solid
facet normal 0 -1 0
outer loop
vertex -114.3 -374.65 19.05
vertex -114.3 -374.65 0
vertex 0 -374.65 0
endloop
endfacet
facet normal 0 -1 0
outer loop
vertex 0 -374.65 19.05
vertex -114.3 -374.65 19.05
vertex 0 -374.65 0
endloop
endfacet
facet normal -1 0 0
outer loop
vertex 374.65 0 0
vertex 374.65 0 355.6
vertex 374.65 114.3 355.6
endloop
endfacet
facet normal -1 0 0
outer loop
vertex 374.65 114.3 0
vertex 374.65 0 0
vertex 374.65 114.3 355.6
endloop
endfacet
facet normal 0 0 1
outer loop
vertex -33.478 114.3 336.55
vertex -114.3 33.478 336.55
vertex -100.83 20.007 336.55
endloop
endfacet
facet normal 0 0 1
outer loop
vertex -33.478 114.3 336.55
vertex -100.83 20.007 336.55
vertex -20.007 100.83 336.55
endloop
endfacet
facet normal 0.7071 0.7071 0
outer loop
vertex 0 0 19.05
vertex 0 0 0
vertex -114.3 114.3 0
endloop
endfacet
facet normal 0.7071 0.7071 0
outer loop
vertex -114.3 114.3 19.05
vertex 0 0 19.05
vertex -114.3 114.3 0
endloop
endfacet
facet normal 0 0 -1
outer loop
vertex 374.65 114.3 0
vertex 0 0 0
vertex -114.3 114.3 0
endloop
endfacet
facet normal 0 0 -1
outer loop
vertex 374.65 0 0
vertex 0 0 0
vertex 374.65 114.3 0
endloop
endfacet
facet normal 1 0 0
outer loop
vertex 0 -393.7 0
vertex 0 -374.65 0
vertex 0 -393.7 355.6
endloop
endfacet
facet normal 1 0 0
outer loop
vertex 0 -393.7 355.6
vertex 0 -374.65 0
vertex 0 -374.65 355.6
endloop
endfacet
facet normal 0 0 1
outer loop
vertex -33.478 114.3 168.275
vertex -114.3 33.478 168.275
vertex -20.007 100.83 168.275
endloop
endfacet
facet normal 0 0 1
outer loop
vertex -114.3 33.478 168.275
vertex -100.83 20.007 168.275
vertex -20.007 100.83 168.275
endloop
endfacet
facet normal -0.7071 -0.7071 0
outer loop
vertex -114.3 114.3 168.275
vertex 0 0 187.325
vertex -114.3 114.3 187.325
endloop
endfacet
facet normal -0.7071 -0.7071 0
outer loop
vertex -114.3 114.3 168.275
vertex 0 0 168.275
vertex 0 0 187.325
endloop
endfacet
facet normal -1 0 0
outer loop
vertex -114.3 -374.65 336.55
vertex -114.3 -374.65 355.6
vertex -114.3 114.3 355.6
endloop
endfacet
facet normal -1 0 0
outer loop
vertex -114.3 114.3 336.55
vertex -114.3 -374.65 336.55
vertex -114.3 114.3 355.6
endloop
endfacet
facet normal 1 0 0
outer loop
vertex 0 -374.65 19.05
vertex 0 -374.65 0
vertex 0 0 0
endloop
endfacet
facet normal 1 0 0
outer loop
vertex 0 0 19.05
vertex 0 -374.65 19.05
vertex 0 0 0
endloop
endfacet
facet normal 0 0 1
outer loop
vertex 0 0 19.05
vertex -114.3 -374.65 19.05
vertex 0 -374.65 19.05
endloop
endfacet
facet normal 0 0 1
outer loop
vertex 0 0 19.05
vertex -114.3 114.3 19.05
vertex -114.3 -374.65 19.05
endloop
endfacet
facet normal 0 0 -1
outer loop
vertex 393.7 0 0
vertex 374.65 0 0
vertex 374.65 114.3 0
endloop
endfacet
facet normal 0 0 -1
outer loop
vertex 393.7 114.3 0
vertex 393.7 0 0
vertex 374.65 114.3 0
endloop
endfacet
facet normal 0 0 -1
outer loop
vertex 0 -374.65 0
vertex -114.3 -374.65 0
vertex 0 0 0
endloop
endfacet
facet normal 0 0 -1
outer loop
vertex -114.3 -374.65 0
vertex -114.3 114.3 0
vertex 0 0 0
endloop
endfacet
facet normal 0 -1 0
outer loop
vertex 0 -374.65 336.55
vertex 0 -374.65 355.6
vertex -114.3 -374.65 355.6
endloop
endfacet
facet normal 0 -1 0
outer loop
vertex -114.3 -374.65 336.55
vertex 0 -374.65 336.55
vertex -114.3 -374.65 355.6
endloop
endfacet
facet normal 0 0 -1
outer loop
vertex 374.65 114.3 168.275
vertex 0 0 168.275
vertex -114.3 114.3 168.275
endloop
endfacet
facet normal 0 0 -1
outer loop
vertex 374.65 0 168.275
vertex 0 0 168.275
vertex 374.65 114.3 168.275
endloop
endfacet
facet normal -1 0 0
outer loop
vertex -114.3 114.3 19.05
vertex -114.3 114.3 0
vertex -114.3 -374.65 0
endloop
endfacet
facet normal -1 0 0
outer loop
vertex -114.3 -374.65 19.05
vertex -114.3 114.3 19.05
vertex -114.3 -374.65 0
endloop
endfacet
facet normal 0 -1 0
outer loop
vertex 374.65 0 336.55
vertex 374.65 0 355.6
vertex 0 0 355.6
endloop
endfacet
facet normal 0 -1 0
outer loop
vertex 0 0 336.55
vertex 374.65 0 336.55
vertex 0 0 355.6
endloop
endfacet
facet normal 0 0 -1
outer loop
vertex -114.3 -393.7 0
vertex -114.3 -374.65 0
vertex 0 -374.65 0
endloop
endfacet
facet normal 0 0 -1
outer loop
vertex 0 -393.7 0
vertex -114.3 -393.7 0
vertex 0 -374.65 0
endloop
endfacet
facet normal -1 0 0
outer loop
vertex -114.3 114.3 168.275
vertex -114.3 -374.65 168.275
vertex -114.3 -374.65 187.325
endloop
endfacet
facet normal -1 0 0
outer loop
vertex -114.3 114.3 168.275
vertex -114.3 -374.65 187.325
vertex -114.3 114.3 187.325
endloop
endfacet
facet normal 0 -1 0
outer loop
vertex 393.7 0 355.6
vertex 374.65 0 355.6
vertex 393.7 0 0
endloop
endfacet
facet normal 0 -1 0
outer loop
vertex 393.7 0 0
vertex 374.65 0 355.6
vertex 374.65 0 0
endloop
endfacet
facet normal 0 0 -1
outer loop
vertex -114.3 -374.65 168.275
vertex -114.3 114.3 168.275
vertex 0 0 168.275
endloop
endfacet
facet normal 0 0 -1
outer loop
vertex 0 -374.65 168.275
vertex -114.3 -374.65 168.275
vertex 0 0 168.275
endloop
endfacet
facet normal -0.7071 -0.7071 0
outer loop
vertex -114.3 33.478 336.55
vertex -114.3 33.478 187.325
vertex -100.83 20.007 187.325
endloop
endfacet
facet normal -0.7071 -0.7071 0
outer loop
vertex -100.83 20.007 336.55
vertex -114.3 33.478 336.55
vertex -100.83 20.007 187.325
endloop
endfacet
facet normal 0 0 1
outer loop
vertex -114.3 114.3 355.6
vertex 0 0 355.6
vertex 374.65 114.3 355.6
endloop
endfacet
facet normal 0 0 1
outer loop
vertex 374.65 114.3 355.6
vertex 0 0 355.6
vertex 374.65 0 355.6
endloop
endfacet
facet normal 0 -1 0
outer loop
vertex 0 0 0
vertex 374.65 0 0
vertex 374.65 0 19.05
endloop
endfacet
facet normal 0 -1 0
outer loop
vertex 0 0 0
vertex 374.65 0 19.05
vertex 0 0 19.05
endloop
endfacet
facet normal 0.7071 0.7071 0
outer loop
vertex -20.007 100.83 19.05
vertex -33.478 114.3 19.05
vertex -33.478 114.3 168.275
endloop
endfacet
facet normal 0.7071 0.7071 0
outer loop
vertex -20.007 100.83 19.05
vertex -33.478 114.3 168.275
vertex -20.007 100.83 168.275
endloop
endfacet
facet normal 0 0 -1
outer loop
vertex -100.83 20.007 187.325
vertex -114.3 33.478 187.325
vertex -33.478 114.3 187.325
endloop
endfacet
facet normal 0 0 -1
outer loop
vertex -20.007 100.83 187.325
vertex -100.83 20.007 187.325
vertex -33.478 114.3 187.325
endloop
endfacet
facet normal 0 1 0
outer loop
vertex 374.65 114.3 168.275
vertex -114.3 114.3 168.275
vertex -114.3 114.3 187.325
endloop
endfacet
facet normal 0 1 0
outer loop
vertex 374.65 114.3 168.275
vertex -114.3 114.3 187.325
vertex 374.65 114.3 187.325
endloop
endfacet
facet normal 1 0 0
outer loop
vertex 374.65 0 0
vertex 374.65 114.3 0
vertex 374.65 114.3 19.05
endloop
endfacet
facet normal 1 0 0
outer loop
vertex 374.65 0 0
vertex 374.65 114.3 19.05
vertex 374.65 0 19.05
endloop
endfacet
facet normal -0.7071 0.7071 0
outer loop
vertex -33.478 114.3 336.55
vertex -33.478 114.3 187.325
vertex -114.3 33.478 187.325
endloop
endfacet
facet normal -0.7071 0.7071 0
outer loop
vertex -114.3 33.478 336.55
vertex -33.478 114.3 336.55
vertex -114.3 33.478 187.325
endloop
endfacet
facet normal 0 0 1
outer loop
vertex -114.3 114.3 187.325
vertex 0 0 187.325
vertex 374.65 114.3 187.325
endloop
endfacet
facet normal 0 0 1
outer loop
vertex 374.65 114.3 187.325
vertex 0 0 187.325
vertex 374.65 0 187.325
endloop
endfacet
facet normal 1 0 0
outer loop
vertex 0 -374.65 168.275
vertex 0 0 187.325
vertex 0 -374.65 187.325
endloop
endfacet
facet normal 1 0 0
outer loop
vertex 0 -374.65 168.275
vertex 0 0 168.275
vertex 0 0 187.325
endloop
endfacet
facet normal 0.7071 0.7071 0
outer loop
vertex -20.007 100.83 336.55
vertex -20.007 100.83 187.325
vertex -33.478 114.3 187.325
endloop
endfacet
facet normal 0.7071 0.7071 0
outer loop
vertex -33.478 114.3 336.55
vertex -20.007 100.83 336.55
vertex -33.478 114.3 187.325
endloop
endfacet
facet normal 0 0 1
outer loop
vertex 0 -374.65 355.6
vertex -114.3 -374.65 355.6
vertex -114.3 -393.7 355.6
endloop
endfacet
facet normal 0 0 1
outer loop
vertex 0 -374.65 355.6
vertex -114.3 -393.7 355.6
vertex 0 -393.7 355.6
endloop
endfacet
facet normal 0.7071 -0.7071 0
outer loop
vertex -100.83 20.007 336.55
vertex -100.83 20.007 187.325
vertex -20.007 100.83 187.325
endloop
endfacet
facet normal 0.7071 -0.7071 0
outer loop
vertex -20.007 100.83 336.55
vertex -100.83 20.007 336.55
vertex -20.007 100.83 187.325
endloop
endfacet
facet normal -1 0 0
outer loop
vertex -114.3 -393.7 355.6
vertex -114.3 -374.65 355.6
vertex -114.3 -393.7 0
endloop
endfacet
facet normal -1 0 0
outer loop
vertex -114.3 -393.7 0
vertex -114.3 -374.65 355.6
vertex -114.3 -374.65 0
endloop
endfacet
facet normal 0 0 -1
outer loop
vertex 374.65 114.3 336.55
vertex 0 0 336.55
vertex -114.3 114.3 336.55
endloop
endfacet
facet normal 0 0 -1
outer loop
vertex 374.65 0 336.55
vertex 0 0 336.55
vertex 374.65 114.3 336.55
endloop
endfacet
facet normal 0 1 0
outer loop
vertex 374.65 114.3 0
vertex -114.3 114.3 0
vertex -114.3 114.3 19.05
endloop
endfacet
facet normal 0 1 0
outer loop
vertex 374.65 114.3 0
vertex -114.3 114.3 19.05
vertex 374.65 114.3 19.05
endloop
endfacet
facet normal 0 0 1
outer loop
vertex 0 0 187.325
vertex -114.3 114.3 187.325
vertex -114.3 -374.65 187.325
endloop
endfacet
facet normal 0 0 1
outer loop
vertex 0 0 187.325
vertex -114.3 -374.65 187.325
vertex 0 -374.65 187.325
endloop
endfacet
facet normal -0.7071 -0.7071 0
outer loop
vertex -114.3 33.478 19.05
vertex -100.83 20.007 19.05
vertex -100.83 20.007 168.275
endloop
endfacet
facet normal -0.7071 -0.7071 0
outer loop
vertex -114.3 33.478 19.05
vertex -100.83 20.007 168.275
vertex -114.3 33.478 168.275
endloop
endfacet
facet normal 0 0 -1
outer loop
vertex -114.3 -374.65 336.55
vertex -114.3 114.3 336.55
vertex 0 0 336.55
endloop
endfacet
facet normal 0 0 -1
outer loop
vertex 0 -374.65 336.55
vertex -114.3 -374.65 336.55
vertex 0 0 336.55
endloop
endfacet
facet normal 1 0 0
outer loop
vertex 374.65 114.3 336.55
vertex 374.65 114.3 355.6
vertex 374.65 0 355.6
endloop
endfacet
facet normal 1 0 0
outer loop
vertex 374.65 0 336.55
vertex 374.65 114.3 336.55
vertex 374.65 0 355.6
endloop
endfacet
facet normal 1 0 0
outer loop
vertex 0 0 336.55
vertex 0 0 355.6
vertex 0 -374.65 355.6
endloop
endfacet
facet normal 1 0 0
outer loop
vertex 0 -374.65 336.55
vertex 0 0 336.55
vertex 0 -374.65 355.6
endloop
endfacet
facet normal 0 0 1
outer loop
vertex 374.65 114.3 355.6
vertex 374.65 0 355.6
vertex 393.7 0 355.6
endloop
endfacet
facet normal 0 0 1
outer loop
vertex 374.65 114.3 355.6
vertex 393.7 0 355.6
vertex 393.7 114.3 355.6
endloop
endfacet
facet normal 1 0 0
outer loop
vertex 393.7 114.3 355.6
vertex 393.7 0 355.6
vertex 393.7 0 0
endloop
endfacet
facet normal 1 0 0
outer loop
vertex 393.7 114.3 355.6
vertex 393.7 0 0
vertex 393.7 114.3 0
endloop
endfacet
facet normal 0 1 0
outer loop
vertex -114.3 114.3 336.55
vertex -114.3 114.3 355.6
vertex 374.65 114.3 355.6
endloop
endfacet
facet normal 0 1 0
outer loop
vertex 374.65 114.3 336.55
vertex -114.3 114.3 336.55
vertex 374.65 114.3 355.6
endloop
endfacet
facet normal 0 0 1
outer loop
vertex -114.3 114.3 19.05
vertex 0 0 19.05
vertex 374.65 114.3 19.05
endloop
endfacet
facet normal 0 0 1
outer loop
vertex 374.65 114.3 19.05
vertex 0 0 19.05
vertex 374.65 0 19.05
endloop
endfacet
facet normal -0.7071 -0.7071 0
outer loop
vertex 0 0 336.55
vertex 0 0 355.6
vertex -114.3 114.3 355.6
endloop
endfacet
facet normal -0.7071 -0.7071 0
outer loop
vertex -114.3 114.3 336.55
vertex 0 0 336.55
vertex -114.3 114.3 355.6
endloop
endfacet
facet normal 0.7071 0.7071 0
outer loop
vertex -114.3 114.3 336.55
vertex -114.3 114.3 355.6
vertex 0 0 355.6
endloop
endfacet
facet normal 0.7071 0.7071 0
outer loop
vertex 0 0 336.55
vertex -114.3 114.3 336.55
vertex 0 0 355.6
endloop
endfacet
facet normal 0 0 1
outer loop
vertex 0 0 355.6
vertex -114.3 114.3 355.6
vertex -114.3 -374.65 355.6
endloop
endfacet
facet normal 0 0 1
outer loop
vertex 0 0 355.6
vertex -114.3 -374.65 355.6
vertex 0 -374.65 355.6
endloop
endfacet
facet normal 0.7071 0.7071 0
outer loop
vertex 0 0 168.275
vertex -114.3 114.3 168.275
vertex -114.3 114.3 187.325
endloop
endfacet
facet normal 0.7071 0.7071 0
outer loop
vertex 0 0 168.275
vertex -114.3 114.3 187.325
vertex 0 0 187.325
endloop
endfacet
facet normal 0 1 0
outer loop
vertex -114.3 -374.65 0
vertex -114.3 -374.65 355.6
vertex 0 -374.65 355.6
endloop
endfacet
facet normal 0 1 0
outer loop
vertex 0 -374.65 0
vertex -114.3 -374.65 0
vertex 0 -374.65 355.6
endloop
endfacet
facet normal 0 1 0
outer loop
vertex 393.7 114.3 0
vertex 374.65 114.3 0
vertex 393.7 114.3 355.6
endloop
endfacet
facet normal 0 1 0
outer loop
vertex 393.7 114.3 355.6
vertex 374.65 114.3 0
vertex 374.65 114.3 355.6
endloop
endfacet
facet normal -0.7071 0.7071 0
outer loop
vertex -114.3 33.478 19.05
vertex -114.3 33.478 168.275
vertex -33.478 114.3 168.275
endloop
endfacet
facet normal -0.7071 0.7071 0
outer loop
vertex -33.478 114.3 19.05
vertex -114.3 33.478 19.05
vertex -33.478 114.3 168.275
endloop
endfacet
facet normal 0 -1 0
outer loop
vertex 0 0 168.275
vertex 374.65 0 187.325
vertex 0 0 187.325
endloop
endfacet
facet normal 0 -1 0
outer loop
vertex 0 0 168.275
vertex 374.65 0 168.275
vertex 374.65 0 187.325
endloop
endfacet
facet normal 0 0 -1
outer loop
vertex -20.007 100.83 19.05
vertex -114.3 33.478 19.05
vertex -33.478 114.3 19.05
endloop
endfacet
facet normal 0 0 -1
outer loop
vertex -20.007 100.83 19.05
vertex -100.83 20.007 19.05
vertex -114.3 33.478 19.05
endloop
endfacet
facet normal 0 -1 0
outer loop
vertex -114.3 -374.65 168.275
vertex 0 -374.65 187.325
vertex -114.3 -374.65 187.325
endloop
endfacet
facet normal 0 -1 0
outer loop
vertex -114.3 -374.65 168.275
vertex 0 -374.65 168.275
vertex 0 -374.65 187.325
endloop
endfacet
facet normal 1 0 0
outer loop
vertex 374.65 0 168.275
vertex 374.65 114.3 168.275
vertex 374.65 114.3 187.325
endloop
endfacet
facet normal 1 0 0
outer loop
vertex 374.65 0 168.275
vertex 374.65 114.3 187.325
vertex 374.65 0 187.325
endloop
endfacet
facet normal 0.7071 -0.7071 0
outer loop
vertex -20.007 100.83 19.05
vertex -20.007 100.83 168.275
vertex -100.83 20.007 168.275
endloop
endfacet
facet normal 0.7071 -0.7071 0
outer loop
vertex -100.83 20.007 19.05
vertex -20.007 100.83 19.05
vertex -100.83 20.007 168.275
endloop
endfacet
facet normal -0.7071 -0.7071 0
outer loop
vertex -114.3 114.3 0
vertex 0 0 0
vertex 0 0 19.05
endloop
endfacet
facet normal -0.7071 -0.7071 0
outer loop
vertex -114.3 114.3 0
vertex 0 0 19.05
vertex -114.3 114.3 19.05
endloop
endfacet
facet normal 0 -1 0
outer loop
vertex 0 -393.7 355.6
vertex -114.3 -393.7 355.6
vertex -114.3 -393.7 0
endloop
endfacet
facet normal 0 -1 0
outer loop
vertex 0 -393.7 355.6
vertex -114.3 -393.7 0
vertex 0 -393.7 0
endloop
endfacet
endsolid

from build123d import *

# Parameters (mm, degrees)
F1_DEPTH  = 19.05
F3_DEPTH  = 19.05
F4_W      = 114.3
F4_H      = 336.55
F4_H_2    = 19.05
F5_DEPTH  = 19.05
F6_W      = 114.3
F6_H      = 336.55
F6_H_2    = 19.05
F7_DEPTH  = 19.05
F10_DEPTH = 19.05
F12_DEPTH = 19.05
F15_DEPTH = 9.525
F17_DEPTH = 9.525
F19_DEPTH = 149.225
F21_DEPTH = 149.225


with BuildPart() as f1:
    # F0 (on Top) → F1 (new body)
    with BuildSketch(Plane.XY):
        Polygon((-114.3, -374.65), (0, -374.65), (0, 0), (-114.3, 114.3), align=None)
    extrude(amount=F1_DEPTH)


with BuildPart() as f3:
    # F2 (on face) → F3 (new body)
    with BuildSketch(Plane(origin=(0, 0, 0), x_dir=(1, 0, 0), z_dir=(0, 0, -1))):
        Polygon((0, 0), (-114.3, -114.3), (374.65, -114.3), (374.65, 0), align=None)
    extrude(amount=-F3_DEPTH)


with BuildPart() as f5:
    # F4 (on face) → F5 (new body)
    with BuildSketch(Plane.XZ.offset(374.65)):
        with Locations((-57.15, 187.325)):
            Rectangle(F4_W, F4_H)
        with Locations((-57.15, 9.525)):
            Rectangle(F4_W, F4_H_2)
    extrude(amount=F5_DEPTH)


with BuildPart() as f7:
    # F6 (on face) → F7 (new body)
    with BuildSketch(Plane.YZ.offset(374.65)):
        with Locations((57.15, 187.325)):
            Rectangle(F6_W, F6_H)
        with Locations((57.15, 9.525)):
            Rectangle(F6_W, F6_H_2)
    extrude(amount=F7_DEPTH)


with BuildPart() as f10:
    # F9 (on offset) → F10 (new body)
    with BuildSketch(Plane(origin=(0, 0, 355.6), x_dir=(1, 0, 0), z_dir=(0, 0, -1))):
        Polygon((-114.3, 374.65), (-114.3, -114.3), (0, 0), (0, 374.65), align=None)
    extrude(amount=F10_DEPTH)


with BuildPart() as f12:
    # F11 (on offset) → F12 (new body)
    with BuildSketch(Plane(origin=(0, 0, 355.6), x_dir=(1, 0, 0), z_dir=(0, 0, -1))):
        Polygon((374.65, 0), (0, 0), (-114.3, -114.3), (374.65, -114.3), align=None)
    extrude(amount=F12_DEPTH)


with BuildPart() as f15:
    # F14 (on mid) → F15 (new body, symmetric)
    with BuildSketch(Plane(origin=(0, 0, 177.8), x_dir=(1, 0, 0), z_dir=(0, 0, -1))):
        Polygon((0, 374.65), (-114.3, 374.65), (-114.3, -114.3), (0, 0), align=None)
    extrude(amount=F15_DEPTH, both=True)


with BuildPart() as f17:
    # F16 (on mid) → F17 (new body, symmetric)
    with BuildSketch(Plane(origin=(0, 0, 177.8), x_dir=(1, 0, 0), z_dir=(0, 0, -1))):
        Polygon((0, 0), (-114.3, -114.3), (374.65, -114.3), (374.65, 0), align=None)
    extrude(amount=F17_DEPTH, both=True)


with BuildPart() as f19:
    # F18 (on face) → F19 (new body, through all)
    with BuildSketch(Plane.XY.offset(187.325)):
        Polygon((-20.0073107288, 100.8296158184), (-33.4776949104, 114.3), (-73.8888474552, 73.8888474552), (-60.4184632736, 60.4184632736), align=None)
        Polygon((-60.4184632736, 60.4184632736), (-73.8888474552, 73.8888474552), (-114.3, 33.4776949104), (-100.8296158184, 20.0073107288), align=None)
    extrude(amount=F19_DEPTH)


with BuildPart() as f21:
    # F20 (on face) → F21 (new body, through all)
    with BuildSketch(Plane(origin=(0, 0, 168.275), x_dir=(1, 0, 0), z_dir=(0, 0, -1))):
        Polygon((-114.3, -33.4776949104), (-73.8888474552, -73.8888474552), (-60.4184632736, -60.4184632736), (-100.8296158184, -20.0073107288), align=None)
        Polygon((-73.8888474552, -73.8888474552), (-33.4776949104, -114.3), (-20.0073107288, -100.8296158184), (-60.4184632736, -60.4184632736), align=None)
    extrude(amount=F21_DEPTH)


solid = Compound([f1.part, f3.part, f5.part, f7.part, f10.part, f12.part, f15.part, f17.part, f19.part, f21.part])
